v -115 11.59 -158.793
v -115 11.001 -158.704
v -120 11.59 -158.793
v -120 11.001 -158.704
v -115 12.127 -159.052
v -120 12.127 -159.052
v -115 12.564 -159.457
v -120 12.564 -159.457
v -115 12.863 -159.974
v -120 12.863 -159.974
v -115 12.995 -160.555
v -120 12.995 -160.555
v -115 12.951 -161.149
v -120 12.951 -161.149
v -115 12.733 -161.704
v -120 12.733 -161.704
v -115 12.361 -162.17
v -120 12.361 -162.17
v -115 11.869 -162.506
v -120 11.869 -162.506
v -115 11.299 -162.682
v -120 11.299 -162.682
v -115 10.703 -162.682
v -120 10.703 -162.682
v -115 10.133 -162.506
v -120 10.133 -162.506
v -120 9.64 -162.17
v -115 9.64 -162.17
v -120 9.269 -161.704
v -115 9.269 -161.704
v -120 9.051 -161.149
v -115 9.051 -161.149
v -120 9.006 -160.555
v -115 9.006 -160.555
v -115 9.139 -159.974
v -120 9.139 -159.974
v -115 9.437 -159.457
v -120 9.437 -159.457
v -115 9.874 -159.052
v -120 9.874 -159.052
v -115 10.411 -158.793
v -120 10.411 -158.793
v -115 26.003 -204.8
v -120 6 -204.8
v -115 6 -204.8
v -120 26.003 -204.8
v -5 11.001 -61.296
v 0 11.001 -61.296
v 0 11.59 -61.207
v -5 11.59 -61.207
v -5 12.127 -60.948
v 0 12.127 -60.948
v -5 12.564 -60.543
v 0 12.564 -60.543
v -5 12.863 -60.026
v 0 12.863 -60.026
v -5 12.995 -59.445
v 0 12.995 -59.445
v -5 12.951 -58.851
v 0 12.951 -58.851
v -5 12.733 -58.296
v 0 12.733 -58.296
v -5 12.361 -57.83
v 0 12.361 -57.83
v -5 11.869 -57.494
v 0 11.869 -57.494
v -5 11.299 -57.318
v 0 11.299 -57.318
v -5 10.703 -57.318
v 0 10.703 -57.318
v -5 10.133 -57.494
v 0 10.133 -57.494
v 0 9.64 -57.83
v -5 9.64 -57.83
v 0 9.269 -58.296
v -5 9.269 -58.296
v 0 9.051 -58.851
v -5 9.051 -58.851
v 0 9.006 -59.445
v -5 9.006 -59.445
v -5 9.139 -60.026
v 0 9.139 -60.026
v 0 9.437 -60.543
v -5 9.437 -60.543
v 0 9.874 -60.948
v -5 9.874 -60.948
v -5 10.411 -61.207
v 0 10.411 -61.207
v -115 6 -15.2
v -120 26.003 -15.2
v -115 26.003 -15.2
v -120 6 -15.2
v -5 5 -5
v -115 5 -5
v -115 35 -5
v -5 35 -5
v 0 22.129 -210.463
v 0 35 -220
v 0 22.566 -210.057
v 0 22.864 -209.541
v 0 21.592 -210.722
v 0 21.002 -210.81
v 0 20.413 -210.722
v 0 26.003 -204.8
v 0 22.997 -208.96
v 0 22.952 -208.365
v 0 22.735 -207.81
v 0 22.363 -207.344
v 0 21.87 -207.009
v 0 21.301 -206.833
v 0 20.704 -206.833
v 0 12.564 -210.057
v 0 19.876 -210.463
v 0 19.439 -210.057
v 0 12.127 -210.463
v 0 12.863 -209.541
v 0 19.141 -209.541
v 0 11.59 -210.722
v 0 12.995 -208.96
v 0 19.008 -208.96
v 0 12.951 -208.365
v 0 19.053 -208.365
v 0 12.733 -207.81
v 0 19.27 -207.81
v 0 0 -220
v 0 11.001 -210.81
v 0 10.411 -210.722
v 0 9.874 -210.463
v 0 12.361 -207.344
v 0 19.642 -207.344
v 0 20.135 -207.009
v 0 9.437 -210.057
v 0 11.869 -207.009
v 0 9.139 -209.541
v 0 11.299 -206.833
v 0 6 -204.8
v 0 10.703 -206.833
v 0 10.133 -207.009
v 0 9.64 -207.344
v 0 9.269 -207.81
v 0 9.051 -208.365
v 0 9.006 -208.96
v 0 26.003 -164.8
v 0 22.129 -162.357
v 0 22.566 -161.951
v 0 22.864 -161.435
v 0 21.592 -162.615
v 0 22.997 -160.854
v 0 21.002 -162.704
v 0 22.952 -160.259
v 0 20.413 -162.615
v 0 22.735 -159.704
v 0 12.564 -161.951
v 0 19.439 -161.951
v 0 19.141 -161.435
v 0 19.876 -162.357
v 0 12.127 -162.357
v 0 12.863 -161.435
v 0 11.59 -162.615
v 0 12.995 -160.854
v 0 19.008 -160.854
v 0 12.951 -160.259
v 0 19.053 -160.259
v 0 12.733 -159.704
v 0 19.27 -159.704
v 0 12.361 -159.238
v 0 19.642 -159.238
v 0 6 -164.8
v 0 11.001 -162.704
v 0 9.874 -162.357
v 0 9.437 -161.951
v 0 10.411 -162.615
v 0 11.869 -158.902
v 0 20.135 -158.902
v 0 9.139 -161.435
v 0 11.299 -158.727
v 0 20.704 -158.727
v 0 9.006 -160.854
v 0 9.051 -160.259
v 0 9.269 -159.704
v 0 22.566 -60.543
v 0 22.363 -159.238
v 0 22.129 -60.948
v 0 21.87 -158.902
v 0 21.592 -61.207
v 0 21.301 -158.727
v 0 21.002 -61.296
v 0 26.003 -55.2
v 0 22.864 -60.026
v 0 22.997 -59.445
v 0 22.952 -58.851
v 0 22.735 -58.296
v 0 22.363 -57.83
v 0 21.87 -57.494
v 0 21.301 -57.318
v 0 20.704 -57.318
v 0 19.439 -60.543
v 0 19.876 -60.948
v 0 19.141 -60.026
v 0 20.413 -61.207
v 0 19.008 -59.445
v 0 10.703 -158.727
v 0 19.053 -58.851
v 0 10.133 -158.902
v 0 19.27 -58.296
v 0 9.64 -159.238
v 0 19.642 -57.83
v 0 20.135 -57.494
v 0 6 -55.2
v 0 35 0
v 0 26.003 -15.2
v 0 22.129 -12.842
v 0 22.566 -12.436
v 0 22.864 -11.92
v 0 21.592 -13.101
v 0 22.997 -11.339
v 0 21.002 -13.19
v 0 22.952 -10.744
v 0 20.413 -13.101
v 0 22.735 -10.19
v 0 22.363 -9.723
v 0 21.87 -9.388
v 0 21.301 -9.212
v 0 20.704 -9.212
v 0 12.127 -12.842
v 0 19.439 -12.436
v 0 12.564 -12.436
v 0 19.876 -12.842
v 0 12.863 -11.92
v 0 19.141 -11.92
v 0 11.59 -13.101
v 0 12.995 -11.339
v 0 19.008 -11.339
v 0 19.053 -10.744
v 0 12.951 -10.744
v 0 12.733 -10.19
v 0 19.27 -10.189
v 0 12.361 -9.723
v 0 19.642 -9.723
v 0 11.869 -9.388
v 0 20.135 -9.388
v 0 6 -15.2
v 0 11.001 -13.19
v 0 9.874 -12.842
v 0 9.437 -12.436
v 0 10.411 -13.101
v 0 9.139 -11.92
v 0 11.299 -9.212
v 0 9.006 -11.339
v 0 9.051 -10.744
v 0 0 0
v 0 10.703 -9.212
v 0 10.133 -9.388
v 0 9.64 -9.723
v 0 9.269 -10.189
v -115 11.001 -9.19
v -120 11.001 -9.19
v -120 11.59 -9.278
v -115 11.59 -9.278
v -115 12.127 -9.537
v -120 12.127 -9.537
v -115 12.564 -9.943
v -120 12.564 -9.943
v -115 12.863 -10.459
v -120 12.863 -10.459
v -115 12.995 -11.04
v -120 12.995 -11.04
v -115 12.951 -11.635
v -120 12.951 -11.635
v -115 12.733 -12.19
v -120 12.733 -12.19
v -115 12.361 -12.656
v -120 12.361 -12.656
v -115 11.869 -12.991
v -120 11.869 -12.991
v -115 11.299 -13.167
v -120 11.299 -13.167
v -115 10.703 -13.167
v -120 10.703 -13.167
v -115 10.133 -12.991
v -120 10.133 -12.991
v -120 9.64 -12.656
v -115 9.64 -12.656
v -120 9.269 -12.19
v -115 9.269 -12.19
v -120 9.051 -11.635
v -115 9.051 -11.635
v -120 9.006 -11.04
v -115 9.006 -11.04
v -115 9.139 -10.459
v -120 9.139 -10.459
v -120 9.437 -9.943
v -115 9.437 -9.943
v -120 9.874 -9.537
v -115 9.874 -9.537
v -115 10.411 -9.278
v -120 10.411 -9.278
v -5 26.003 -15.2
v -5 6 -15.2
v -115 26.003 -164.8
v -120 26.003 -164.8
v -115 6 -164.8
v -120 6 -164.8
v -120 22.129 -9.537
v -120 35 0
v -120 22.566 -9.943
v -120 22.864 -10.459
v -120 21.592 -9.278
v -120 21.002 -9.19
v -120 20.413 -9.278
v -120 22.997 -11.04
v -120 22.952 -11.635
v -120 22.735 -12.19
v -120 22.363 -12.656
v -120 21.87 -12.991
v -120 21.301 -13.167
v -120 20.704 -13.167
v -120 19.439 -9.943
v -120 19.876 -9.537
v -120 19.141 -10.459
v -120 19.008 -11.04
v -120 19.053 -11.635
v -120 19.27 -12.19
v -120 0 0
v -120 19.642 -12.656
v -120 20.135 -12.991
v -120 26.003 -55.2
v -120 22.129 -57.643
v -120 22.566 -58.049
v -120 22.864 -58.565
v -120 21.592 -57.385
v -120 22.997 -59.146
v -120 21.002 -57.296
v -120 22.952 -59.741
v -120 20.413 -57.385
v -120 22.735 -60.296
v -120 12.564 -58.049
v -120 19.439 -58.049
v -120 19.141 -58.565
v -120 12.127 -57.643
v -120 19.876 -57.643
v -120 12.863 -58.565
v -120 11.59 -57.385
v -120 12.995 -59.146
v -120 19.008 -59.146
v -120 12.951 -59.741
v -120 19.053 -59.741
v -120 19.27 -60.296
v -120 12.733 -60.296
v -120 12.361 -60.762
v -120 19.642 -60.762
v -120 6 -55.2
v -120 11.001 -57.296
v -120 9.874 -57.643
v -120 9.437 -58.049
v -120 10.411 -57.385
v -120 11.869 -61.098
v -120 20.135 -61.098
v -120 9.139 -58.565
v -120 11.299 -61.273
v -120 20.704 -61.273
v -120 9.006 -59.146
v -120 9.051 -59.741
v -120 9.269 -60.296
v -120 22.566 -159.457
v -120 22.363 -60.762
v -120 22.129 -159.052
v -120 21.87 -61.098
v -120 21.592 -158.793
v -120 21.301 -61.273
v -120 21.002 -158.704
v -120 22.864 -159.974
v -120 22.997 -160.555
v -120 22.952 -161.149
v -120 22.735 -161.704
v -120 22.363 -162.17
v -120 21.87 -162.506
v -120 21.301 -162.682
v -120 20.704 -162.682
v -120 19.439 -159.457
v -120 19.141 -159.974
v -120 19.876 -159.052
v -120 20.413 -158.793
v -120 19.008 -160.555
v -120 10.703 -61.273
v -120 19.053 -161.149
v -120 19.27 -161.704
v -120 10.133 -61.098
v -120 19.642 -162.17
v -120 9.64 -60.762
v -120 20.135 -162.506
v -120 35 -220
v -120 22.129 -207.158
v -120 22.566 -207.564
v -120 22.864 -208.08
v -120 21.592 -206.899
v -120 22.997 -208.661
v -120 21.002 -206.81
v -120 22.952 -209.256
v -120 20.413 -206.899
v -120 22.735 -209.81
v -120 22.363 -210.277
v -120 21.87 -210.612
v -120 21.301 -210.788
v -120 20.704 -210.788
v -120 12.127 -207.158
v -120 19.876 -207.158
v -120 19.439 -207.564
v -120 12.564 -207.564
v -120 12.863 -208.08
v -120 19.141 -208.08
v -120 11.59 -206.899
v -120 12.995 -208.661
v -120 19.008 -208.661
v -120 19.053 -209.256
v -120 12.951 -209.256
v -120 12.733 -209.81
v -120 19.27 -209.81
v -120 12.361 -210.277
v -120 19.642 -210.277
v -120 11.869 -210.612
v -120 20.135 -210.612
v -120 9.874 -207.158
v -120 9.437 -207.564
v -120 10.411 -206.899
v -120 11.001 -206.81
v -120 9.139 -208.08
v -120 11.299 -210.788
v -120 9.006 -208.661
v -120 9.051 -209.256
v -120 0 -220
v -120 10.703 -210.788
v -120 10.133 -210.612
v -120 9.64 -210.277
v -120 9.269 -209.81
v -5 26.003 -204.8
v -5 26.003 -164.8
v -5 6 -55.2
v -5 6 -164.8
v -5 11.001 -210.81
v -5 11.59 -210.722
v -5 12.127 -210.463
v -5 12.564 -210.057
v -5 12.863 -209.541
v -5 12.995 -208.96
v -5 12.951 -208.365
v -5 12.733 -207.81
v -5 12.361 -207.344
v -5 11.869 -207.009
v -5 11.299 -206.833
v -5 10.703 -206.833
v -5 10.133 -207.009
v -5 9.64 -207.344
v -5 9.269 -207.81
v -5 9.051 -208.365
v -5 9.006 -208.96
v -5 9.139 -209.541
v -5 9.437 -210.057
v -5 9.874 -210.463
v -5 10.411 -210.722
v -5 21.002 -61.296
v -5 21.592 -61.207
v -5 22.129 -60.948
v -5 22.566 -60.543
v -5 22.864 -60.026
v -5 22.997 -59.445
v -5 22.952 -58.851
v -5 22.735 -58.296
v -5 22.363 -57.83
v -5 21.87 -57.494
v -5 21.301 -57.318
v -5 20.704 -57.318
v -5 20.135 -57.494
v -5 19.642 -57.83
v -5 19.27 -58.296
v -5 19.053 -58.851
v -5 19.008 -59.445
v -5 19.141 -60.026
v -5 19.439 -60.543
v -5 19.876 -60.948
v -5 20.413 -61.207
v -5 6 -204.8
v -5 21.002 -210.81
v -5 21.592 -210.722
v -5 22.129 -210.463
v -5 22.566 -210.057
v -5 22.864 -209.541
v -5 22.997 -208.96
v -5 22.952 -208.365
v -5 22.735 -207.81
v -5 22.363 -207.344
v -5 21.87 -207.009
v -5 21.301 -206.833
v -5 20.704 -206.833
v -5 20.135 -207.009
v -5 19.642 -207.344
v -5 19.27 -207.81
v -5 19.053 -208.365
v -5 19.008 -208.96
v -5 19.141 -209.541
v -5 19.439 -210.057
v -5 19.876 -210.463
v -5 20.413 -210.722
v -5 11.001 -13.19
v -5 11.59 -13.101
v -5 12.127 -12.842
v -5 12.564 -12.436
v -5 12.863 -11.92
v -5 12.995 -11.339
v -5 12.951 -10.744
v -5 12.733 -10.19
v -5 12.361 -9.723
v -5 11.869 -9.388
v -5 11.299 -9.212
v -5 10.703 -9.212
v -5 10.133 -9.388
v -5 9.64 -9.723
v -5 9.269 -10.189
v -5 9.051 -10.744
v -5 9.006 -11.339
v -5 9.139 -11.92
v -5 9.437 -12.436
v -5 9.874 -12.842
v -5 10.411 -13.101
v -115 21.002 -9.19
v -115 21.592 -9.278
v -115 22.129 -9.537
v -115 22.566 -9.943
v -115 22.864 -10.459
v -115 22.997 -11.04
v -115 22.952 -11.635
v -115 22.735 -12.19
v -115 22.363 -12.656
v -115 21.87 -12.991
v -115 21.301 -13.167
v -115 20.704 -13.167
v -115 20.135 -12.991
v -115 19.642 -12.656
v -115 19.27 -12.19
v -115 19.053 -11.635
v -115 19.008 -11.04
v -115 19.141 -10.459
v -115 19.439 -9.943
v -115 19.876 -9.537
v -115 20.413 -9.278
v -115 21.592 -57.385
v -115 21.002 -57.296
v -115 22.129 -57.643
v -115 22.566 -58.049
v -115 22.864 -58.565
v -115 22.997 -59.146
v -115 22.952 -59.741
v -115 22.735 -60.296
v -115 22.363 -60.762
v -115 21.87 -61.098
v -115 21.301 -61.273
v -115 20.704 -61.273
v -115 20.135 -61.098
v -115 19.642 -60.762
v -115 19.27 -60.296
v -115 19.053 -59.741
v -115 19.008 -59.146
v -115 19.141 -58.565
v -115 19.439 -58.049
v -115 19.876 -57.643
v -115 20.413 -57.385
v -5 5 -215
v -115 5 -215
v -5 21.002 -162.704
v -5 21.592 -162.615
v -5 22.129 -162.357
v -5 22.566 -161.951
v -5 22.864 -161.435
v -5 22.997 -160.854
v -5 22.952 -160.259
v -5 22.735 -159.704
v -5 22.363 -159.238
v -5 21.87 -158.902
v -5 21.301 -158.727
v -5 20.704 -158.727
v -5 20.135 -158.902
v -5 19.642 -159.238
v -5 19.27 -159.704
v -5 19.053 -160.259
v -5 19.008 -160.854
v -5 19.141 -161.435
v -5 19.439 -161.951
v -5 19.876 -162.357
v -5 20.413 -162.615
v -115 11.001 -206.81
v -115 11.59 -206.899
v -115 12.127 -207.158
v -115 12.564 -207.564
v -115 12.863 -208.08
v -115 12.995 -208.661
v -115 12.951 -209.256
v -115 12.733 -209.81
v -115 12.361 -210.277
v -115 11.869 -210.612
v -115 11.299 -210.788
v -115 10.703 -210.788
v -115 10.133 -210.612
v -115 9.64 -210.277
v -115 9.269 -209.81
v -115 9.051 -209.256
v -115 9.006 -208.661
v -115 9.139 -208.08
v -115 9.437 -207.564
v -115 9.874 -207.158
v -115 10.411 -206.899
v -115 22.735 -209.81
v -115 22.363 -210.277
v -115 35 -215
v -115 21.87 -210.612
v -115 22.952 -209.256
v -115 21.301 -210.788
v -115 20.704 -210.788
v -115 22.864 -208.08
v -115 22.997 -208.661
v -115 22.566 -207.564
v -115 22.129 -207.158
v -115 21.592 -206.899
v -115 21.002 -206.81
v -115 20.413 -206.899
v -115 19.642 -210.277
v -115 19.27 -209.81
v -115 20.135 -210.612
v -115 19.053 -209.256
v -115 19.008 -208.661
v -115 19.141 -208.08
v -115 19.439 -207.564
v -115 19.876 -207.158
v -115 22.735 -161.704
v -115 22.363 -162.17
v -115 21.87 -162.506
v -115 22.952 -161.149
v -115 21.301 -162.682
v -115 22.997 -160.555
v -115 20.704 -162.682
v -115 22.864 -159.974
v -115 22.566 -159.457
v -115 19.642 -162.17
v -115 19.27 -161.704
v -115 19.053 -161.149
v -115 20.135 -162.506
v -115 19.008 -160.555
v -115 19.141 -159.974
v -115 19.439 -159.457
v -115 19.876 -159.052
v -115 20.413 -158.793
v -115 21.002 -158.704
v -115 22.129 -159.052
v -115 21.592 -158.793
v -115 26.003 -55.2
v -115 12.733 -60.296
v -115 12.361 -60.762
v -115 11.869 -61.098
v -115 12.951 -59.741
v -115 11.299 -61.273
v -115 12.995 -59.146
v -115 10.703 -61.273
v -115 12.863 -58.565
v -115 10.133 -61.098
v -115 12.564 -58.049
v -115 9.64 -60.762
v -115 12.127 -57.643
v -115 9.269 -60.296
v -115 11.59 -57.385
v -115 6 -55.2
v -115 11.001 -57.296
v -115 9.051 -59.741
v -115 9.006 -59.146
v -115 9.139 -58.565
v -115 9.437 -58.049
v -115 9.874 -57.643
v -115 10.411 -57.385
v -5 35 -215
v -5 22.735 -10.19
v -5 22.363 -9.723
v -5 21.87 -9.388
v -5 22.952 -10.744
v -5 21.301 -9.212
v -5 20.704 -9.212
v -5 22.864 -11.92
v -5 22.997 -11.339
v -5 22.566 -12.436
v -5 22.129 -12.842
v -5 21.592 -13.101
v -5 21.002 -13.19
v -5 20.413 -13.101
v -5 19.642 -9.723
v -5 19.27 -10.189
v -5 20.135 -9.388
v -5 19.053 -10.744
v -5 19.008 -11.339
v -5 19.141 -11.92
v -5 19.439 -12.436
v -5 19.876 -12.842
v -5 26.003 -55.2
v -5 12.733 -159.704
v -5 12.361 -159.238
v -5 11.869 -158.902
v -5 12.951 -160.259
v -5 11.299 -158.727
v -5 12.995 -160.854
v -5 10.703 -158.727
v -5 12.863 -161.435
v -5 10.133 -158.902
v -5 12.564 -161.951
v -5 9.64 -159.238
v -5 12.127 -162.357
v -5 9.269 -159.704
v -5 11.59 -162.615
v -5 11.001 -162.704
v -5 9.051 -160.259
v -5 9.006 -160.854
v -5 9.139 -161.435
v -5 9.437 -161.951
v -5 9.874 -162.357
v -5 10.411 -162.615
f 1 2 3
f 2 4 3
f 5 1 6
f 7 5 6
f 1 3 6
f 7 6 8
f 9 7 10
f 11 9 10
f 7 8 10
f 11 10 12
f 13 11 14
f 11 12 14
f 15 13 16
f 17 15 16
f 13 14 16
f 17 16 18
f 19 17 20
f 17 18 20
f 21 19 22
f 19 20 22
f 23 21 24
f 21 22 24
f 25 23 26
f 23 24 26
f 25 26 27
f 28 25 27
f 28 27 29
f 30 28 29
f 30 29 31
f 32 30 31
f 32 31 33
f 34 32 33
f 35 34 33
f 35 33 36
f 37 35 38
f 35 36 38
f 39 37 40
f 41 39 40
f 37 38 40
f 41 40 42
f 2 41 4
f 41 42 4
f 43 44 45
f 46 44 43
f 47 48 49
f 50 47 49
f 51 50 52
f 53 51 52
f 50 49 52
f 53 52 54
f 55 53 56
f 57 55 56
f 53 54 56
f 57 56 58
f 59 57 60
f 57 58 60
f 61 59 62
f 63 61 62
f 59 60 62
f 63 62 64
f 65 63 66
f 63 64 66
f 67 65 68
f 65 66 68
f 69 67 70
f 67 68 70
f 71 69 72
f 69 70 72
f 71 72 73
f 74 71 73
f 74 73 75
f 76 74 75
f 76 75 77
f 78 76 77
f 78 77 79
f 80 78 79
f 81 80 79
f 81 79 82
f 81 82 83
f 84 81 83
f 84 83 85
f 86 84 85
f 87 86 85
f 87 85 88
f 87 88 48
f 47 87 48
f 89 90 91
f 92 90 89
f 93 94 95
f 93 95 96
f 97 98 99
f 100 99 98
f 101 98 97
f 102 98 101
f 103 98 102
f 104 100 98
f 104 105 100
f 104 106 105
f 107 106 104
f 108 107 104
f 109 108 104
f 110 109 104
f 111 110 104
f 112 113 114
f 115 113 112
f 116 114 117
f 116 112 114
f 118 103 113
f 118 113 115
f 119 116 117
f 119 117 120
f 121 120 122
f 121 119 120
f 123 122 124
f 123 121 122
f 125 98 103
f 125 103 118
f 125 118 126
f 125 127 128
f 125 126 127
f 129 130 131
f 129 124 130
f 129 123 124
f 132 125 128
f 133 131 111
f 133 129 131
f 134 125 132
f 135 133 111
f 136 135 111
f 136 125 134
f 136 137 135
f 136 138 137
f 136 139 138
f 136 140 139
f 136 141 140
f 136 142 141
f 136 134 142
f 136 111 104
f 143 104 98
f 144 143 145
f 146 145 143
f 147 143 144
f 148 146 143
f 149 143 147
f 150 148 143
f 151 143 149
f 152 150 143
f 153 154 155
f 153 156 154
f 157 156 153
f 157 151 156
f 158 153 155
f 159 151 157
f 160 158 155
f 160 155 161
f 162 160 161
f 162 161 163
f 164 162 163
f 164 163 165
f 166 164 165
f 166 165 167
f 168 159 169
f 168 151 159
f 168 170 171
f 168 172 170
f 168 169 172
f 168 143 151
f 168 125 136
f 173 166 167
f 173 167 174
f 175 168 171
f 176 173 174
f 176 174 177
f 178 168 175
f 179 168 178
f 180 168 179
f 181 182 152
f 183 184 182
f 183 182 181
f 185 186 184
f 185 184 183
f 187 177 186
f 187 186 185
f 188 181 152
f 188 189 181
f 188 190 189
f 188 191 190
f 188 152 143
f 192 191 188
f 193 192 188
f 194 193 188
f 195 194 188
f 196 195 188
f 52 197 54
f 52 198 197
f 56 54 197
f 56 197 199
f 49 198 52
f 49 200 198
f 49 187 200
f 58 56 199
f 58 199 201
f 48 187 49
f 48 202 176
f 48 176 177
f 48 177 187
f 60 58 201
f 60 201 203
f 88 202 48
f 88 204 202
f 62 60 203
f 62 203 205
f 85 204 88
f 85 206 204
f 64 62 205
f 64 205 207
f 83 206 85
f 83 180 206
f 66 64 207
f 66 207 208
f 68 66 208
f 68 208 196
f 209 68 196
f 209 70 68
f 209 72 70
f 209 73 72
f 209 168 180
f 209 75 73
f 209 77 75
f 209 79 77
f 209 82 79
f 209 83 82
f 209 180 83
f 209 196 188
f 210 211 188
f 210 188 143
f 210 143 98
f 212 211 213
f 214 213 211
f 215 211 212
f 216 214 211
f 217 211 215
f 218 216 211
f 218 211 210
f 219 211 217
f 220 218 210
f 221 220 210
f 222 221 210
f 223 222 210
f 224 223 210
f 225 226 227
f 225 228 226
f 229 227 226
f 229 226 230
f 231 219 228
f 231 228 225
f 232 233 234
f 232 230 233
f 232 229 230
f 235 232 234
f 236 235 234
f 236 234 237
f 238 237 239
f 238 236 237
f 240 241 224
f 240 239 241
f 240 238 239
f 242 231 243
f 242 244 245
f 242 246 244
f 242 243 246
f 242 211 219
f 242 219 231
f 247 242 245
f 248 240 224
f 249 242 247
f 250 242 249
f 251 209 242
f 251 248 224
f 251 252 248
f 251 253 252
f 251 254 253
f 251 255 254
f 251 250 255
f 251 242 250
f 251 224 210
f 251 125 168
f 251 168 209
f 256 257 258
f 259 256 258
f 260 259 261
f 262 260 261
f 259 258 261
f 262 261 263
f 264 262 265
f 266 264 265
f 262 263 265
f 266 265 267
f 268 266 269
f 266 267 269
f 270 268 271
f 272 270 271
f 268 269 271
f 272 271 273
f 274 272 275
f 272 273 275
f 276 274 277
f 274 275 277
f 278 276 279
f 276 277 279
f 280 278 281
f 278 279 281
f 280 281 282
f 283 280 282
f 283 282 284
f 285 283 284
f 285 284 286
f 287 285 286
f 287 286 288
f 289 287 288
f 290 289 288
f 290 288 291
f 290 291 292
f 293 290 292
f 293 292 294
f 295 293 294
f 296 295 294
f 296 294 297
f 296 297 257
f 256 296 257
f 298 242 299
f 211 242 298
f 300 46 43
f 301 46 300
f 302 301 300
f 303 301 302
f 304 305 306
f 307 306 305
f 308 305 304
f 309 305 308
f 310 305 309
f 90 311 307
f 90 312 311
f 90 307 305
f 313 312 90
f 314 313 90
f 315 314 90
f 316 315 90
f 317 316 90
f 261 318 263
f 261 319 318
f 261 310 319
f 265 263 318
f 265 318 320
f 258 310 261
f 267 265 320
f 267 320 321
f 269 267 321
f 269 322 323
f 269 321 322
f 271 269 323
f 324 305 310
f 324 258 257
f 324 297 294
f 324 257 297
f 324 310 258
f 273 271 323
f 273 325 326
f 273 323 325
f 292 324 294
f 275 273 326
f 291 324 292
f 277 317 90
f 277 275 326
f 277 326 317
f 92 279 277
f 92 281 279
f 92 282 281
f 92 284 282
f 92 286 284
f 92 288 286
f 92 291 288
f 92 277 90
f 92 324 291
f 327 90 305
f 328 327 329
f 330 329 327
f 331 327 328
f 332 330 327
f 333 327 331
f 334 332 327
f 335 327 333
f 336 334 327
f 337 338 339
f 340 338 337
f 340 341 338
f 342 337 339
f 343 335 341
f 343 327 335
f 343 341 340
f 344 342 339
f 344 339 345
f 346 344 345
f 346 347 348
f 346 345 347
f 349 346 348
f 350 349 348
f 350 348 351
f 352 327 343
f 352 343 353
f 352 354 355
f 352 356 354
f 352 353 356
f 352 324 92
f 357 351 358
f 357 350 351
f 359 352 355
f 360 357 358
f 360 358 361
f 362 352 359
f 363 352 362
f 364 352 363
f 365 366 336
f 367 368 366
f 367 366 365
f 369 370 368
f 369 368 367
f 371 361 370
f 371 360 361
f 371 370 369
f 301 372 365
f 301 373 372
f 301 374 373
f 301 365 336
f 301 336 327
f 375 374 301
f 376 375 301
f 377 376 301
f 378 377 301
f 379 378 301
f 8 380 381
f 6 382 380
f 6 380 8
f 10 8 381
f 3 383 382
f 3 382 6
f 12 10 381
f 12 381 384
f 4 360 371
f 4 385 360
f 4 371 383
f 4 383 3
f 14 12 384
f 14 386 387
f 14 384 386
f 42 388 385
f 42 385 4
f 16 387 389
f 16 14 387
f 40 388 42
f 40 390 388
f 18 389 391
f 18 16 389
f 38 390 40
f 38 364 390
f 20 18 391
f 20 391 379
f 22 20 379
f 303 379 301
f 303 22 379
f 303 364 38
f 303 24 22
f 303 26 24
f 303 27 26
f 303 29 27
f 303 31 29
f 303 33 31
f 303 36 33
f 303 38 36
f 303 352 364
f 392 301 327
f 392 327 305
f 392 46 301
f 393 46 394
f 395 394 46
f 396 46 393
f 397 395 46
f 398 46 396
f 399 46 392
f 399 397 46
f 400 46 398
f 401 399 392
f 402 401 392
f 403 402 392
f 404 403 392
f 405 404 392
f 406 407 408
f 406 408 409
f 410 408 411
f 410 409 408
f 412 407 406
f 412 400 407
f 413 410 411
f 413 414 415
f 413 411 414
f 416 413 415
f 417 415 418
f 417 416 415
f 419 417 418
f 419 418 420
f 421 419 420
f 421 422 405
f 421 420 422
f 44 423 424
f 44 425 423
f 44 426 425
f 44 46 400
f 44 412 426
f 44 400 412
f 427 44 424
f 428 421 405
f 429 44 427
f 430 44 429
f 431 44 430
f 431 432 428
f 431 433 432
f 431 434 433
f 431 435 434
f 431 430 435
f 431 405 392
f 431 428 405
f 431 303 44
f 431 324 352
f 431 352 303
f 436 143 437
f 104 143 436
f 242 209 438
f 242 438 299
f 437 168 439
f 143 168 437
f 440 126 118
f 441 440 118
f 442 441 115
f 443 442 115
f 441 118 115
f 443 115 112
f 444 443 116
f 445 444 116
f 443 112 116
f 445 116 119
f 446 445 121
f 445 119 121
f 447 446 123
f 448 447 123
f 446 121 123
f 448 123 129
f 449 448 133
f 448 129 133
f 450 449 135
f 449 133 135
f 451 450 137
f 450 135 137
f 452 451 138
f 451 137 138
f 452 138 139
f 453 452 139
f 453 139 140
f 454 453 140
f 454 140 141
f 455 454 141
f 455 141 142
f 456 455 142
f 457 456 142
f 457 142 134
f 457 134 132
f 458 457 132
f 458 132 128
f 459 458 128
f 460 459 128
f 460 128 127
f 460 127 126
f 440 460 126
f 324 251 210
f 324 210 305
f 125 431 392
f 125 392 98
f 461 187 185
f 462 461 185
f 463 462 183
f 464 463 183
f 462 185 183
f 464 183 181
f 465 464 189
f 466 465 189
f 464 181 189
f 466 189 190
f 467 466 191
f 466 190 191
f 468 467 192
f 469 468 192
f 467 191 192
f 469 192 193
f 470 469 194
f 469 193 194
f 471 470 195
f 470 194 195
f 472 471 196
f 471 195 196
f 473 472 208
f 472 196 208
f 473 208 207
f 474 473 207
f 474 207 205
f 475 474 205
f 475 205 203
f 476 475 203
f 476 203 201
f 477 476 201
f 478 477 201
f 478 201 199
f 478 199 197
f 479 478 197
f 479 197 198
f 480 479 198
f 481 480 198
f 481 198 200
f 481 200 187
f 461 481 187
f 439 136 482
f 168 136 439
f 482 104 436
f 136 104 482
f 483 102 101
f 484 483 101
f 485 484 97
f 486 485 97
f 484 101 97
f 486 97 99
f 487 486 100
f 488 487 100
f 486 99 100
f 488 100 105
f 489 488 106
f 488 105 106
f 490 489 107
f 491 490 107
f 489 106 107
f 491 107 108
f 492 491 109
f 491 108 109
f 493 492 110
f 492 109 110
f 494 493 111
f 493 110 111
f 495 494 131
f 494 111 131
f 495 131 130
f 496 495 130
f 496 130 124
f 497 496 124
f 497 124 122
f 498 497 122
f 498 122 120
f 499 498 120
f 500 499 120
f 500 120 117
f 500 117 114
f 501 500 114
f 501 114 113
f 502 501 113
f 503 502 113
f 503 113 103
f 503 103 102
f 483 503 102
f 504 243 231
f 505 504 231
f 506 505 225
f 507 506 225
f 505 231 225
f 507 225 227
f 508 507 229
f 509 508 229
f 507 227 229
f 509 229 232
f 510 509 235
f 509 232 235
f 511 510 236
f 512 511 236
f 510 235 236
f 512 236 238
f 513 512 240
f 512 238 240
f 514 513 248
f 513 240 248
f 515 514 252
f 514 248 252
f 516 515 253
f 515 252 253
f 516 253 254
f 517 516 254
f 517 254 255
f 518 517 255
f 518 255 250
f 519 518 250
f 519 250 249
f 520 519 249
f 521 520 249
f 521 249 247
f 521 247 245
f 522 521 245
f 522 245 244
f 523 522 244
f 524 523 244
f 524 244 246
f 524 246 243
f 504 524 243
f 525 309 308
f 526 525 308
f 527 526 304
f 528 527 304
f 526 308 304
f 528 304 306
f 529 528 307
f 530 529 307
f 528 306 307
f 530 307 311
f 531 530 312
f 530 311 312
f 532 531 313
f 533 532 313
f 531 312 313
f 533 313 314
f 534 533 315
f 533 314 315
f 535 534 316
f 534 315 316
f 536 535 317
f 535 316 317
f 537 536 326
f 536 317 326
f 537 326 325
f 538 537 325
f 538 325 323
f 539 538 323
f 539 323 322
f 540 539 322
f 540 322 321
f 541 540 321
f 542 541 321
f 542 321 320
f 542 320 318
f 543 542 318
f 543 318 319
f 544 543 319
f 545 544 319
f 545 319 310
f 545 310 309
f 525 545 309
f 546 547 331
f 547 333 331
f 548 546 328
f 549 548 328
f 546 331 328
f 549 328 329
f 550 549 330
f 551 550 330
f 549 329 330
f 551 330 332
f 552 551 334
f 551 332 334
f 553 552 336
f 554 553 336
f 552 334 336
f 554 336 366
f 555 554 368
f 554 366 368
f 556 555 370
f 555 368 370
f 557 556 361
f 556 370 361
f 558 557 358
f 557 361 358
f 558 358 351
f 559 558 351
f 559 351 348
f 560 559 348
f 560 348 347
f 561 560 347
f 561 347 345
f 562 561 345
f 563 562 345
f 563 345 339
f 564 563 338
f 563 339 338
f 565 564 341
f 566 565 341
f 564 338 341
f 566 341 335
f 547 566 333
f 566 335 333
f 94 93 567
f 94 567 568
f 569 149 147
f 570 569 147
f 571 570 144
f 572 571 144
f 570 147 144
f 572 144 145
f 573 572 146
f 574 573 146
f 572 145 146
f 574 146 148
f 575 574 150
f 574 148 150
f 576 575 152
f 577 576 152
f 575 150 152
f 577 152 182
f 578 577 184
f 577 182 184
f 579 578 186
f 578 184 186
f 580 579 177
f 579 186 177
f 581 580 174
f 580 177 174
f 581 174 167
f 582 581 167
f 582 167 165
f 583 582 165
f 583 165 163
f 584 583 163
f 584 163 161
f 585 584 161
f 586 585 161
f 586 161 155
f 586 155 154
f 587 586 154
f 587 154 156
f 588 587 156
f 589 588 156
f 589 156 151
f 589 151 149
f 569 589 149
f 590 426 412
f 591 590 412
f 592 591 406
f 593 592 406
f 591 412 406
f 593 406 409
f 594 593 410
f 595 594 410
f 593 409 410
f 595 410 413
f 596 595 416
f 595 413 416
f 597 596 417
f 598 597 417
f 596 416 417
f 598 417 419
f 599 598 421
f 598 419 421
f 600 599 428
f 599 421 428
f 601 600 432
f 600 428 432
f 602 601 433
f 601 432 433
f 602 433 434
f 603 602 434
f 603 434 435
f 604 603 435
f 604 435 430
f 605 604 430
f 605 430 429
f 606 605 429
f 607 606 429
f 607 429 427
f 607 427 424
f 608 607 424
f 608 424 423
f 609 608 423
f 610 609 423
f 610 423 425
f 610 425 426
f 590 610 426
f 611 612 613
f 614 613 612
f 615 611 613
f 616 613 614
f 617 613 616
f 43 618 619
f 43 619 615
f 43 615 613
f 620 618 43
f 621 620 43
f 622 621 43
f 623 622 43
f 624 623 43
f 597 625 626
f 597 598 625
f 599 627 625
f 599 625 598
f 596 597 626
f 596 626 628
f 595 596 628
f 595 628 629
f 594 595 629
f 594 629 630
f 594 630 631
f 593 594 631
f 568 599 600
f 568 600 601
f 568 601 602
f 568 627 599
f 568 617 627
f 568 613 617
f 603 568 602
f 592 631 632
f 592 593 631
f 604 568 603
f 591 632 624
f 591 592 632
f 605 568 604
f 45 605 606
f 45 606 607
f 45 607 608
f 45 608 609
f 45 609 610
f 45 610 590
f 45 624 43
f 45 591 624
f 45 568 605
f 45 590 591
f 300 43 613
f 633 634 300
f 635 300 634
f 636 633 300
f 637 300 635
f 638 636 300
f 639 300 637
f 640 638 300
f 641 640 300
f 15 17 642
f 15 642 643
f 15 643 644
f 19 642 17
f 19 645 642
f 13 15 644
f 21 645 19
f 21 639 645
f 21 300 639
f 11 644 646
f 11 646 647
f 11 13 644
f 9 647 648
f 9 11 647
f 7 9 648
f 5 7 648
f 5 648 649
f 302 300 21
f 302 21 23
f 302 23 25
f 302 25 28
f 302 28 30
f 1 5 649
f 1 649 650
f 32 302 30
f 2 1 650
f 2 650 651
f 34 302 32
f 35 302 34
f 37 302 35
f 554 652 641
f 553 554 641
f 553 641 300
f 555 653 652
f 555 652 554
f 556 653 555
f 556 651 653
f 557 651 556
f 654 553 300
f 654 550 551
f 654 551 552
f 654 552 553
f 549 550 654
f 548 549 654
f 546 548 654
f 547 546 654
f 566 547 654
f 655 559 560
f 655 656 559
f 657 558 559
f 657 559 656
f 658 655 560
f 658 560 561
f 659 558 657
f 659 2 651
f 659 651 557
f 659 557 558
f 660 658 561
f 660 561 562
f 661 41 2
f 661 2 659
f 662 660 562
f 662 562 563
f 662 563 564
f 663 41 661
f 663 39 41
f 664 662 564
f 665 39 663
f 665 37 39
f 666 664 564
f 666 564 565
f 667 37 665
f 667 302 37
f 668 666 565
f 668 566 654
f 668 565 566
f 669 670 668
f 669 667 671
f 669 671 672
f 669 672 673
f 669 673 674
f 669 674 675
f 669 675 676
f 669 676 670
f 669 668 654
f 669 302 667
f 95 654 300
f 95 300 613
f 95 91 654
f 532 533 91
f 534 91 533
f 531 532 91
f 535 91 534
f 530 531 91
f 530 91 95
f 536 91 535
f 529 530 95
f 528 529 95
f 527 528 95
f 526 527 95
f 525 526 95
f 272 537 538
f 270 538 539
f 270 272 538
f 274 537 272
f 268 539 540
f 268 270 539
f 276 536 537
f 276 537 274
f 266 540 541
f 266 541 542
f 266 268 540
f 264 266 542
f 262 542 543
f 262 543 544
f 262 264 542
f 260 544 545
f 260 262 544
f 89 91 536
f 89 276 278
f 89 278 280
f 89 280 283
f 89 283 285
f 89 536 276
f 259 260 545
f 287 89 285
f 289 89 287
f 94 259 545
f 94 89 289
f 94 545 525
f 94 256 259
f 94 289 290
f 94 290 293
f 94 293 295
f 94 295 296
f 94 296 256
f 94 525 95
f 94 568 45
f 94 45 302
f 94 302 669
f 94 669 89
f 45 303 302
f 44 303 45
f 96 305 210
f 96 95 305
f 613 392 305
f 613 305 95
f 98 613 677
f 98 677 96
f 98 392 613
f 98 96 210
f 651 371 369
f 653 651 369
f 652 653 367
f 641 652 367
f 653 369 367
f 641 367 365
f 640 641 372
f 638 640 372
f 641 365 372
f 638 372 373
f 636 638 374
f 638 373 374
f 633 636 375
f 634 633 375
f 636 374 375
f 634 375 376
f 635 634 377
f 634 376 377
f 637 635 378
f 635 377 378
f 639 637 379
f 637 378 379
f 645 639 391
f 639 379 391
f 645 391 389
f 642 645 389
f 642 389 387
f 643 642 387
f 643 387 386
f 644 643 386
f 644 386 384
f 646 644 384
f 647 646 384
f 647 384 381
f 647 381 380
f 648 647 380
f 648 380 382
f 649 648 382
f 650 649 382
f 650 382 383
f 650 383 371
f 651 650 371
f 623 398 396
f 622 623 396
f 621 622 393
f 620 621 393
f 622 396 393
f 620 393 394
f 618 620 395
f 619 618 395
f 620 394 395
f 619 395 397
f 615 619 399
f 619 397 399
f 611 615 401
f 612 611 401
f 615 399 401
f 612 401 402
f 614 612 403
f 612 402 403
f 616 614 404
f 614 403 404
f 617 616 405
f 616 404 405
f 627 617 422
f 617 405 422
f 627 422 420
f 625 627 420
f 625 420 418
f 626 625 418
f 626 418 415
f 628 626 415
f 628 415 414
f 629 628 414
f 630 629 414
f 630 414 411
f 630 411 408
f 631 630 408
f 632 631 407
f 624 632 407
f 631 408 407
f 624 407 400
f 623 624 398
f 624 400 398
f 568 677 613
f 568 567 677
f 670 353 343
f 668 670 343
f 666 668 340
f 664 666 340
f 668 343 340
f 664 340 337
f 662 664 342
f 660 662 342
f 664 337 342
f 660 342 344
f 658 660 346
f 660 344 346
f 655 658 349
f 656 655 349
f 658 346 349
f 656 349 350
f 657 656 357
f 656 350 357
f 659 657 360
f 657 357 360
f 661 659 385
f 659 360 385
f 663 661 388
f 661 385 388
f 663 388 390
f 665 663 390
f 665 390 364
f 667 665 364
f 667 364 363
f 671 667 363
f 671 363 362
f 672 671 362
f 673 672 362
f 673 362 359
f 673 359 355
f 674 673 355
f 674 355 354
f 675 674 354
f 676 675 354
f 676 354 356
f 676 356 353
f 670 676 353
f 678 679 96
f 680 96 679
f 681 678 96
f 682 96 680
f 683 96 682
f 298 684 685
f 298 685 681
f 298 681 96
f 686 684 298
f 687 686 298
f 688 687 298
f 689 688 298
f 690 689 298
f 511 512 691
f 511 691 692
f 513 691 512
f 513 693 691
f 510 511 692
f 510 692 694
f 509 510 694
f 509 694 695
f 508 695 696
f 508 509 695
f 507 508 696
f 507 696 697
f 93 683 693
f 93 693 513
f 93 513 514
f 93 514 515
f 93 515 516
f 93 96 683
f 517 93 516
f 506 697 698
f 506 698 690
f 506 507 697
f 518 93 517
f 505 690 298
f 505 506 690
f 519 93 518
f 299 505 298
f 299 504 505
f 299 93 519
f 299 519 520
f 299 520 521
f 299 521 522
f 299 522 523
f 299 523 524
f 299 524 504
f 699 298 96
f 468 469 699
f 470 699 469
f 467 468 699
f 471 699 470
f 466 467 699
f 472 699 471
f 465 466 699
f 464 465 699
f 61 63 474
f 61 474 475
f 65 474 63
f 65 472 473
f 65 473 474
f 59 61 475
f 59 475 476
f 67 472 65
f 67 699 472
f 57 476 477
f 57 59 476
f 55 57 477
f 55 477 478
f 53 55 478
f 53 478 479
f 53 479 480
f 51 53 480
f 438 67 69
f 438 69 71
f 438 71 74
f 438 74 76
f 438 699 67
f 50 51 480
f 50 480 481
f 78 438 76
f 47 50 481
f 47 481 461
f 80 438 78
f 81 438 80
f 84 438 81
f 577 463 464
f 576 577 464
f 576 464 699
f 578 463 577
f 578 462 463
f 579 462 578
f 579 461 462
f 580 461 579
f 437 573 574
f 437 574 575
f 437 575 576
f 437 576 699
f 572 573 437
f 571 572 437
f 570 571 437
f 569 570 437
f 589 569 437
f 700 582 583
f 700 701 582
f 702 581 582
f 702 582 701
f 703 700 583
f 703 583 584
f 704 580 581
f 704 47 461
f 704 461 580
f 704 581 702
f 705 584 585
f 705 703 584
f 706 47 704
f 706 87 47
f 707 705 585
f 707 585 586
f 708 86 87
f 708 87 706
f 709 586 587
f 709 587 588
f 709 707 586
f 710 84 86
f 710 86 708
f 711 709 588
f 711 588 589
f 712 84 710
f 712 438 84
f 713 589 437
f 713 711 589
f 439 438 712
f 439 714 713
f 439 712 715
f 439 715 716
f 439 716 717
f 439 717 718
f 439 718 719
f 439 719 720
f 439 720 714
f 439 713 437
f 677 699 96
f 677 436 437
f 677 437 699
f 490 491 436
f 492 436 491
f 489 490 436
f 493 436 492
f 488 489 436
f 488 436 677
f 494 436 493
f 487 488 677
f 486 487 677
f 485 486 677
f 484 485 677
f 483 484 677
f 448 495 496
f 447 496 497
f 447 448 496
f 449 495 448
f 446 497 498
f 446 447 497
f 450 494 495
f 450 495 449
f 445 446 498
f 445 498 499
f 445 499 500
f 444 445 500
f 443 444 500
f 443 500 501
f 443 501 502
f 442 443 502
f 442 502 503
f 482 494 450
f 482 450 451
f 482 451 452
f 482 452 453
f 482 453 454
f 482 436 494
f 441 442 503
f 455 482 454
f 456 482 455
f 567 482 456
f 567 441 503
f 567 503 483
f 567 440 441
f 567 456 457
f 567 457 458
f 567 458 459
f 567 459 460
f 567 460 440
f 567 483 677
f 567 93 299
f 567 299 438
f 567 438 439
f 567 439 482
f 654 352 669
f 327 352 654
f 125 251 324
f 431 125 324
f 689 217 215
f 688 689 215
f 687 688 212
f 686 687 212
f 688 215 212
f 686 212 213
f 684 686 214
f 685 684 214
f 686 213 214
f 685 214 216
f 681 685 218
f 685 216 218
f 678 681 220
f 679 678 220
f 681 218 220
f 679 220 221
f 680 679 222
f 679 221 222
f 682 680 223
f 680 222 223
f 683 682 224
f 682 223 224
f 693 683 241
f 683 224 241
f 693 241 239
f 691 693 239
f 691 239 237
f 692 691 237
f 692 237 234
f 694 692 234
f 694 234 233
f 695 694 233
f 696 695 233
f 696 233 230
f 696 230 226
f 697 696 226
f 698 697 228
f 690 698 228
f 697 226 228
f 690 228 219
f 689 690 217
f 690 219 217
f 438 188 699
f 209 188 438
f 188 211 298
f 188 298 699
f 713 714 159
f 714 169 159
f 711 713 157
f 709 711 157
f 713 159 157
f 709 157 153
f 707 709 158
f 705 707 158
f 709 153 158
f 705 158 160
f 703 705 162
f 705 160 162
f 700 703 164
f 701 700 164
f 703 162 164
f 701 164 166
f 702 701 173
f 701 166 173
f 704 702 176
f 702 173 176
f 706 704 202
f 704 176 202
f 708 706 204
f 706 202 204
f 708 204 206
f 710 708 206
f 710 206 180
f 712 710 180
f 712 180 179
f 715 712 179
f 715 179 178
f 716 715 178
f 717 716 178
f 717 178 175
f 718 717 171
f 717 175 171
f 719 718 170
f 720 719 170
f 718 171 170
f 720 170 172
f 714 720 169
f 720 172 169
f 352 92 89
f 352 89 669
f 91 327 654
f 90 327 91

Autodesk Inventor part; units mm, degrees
ref_plane "YZ Plane" through (0, 0, 0) normal (1, 0, 0) x (0, 1, 0)
ref_plane "XZ Plane" through (0, 0, 0) normal (0, 1, 0) x (-1, 0, 0)
ref_plane "XY Plane" through (0, 0, 0) normal (0, 0, 1) x (1, 0, 0)
sketch "servo" plane through (0, 0, 0) normal (0, 0, 1) x (1, 0, 0)
  line L0 (0, -20.0033) -> (0, 0)
  line L1 (54.4, 0) -> (54.4, -20.0033)
  line L2 (0, 0) -> (54.4, 0)
  line L3 (54.4, 0) -> (54.4, -20.0033)
  line L4 (54.4, -20.0033) -> (0, -20.0033)
  line L5 (0, -20.0033) -> (0, 0)
  circle A0 centre (3.1042, -5.0008) radius 2
  circle A1 centre (3.1042, -5.0008) radius 2
  circle A2 centre (3.1042, -15.0025) radius 2
  circle A3 centre (3.1042, -15.0025) radius 2
  circle A4 centre (51.2105, -15.0025) radius 2
  circle A5 centre (51.2105, -15.0025) radius 2
  circle A6 centre (51.2105, -5.0008) radius 2
  circle A7 centre (51.2105, -5.0008) radius 2
  line L6 (47.2, -20.0033) -> (7.2, -20.0033)
  line L7 (47.2, -20.0033) -> (7.2, -20.0033)
  line L8 (7.2, -20.0033) -> (7.2, 0)
  line L9 (7.2, 0) -> (47.2, 0)
  line L10 (47.2, 0) -> (47.2, -20.0033)
  circle A8 centre (36.7104, -10.0017) radius 2.9
  circle A9 centre (36.7104, -10.0017) radius 2.9
  point P0 (27.5156, -10.5472)
sketch "Sketch1" plane through (0, 0, 0) normal (0, 1, 0) x (-1, 0, 0)
  line L0 (0, 0) -> (120, 0)
  line L1 (120, 0) -> (120, -220)
  line L2 (120, -220) -> (0, -220)
  line L3 (0, -220) -> (0, 0)
  dimension "d0" = 120
  dimension "d1" = 220
extrude "Extrusion1" add sketch "Sketch1" along normal blind 5
sketch "Sketch3" plane through (0, 5, 0) normal (0, 1, 0) x (1, 0, 0)
  line L0 (-120, 0) -> (0, 0) projected
  line L1 (0, 0) -> (0, 220) projected
  line L2 (-120, 0) -> (0, 0)
  line L3 (0, 0) -> (0, 220)
  line L4 (0, 220) -> (-120, 220)
  line L5 (-120, 220) -> (-120, 0)
  line L6 (-115, 5) -> (-5, 5)
  line L7 (-5, 5) -> (-5, 215)
  line L8 (-5, 215) -> (-115, 215)
  line L9 (-115, 215) -> (-115, 5)
  dimension "d4" = 5
  dimension "d5" = 5
  dimension "d6" = 5
  dimension "d7" = 5
extrude "Extrusion2" add sketch "Sketch3" along normal blind 30
sketch "Sketch4" plane through (0, 0, 0) normal (1, 0, 0) x (0, 0, -1)
  line L0 (0, 0) -> (0, 35) projected
  line L1 (220, 0) -> (0, 0) projected
  line L2 (220, 0) -> (220, 35) projected
  line L3 (62.4, 26.0033) -> (62.4, 6)
  line L4 (8, 6) -> (8, 26.0033)
  line L5 (62.4, 6) -> (8, 6)
  line L6 (8, 6) -> (8, 26.0033)
  line L7 (8, 26.0033) -> (62.4, 26.0033)
  line L8 (62.4, 26.0033) -> (62.4, 6)
  circle A0 centre (59.2958, 11.0008) radius 2
  circle A1 centre (59.2958, 11.0008) radius 2
  circle A2 centre (59.2958, 21.0025) radius 2
  circle A3 centre (59.2958, 21.0025) radius 2
  circle A4 centre (11.1895, 21.0025) radius 2
  circle A5 centre (11.1895, 21.0025) radius 2
  circle A6 centre (11.1895, 11.0008) radius 2
  circle A7 centre (11.1895, 11.0008) radius 2
  line L9 (15.2, 26.0033) -> (55.2, 26.0033)
  line L10 (15.2, 26.0033) -> (55.2, 26.0033)
  line L11 (55.2, 26.0033) -> (55.2, 6)
  line L12 (55.2, 6) -> (15.2, 6)
  line L13 (15.2, 6) -> (15.2, 26.0033)
  circle A8 centre (25.6896, 16.0017) radius 2.9
  circle A9 centre (25.6896, 16.0017) radius 2.9
  line L14 (157.6, 6) -> (157.6, 26.0033)
  line L15 (212, 26.0033) -> (212, 6)
  line L16 (157.6, 26.0033) -> (212, 26.0033)
  line L17 (212, 26.0033) -> (212, 6)
  line L18 (212, 6) -> (157.6, 6)
  line L19 (157.6, 6) -> (157.6, 26.0033)
  circle A10 centre (160.7042, 21.0025) radius 2
  circle A11 centre (160.7042, 21.0025) radius 2
  circle A12 centre (160.7042, 11.0008) radius 2
  circle A13 centre (160.7042, 11.0008) radius 2
  circle A14 centre (208.8105, 11.0008) radius 2
  circle A15 centre (208.8105, 11.0008) radius 2
  circle A16 centre (208.8105, 21.0025) radius 2
  circle A17 centre (208.8105, 21.0025) radius 2
  line L20 (204.8, 6) -> (164.8, 6)
  line L21 (204.8, 6) -> (164.8, 6)
  line L22 (164.8, 6) -> (164.8, 26.0033)
  line L23 (164.8, 26.0033) -> (204.8, 26.0033)
  line L24 (204.8, 26.0033) -> (204.8, 6)
  circle A18 centre (194.3104, 16.0017) radius 2.9
  circle A19 centre (194.3104, 16.0017) radius 2.9
  dimension "d10" = 8
  dimension "d11" = 6
  dimension "d12" = 8
  dimension "d13" = 6
sketch "Sketch5" plane through (-120, 0, -220) normal (-1, 0, 0) x (0, 0, 1)
  line L0 (220, 0) -> (0, 0) projected
  line L1 (0, 0) -> (0, 35) projected
  line L2 (220, 0) -> (220, 35) projected
  line L3 (157.6, 6) -> (157.6, 26.0033)
  line L4 (212, 26.0033) -> (212, 6)
  line L5 (157.6, 26.0033) -> (212, 26.0033)
  line L6 (212, 26.0033) -> (212, 6)
  line L7 (212, 6) -> (157.6, 6)
  line L8 (157.6, 6) -> (157.6, 26.0033)
  circle A0 centre (160.7042, 21.0025) radius 2
  circle A1 centre (160.7042, 21.0025) radius 2
  circle A2 centre (160.7042, 11.0008) radius 2
  circle A3 centre (160.7042, 11.0008) radius 2
  circle A4 centre (208.8105, 11.0008) radius 2
  circle A5 centre (208.8105, 11.0008) radius 2
  circle A6 centre (208.8105, 21.0025) radius 2
  circle A7 centre (208.8105, 21.0025) radius 2
  line L9 (204.8, 6) -> (164.8, 6)
  line L10 (204.8, 6) -> (164.8, 6)
  line L11 (164.8, 6) -> (164.8, 26.0033)
  line L12 (164.8, 26.0033) -> (204.8, 26.0033)
  line L13 (204.8, 26.0033) -> (204.8, 6)
  circle A8 centre (194.3104, 16.0017) radius 2.9
  circle A9 centre (194.3104, 16.0017) radius 2.9
  line L14 (62.4, 26.0033) -> (62.4, 6)
  line L15 (8, 6) -> (8, 26.0033)
  line L16 (62.4, 6) -> (8, 6)
  line L17 (8, 6) -> (8, 26.0033)
  line L18 (8, 26.0033) -> (62.4, 26.0033)
  line L19 (62.4, 26.0033) -> (62.4, 6)
  circle A10 centre (59.2958, 11.0008) radius 2
  circle A11 centre (59.2958, 11.0008) radius 2
  circle A12 centre (59.2958, 21.0025) radius 2
  circle A13 centre (59.2958, 21.0025) radius 2
  circle A14 centre (11.1895, 21.0025) radius 2
  circle A15 centre (11.1895, 21.0025) radius 2
  circle A16 centre (11.1895, 11.0008) radius 2
  circle A17 centre (11.1895, 11.0008) radius 2
  line L20 (15.2, 26.0033) -> (55.2, 26.0033)
  line L21 (15.2, 26.0033) -> (55.2, 26.0033)
  line L22 (55.2, 26.0033) -> (55.2, 6)
  line L23 (55.2, 6) -> (15.2, 6)
  line L24 (15.2, 6) -> (15.2, 26.0033)
  circle A18 centre (25.6896, 16.0017) radius 2.9
  circle A19 centre (25.6896, 16.0017) radius 2.9
  dimension "d14" = 6
  dimension "d15" = 8
  dimension "d16" = 6
  dimension "d17" = 8
extrude "Extrusion3" cut sketch "Sketch4" against normal blind 5 contours L11 L5 L13 L7 | A0 | A2 | A4 | A6 | A8 | L22 L16 L24 L18 | A10 | A12 | A14 | A16 | A18
extrude "Extrusion4" cut sketch "Sketch5" against normal blind 5 contours L11 L5 L13 L7 | A0 | A2 | A4 | A6 | A8 | L22 L16 L24 L18 | A10 | A12 | A14 | A16 | A18
properties part number "Tronco"
